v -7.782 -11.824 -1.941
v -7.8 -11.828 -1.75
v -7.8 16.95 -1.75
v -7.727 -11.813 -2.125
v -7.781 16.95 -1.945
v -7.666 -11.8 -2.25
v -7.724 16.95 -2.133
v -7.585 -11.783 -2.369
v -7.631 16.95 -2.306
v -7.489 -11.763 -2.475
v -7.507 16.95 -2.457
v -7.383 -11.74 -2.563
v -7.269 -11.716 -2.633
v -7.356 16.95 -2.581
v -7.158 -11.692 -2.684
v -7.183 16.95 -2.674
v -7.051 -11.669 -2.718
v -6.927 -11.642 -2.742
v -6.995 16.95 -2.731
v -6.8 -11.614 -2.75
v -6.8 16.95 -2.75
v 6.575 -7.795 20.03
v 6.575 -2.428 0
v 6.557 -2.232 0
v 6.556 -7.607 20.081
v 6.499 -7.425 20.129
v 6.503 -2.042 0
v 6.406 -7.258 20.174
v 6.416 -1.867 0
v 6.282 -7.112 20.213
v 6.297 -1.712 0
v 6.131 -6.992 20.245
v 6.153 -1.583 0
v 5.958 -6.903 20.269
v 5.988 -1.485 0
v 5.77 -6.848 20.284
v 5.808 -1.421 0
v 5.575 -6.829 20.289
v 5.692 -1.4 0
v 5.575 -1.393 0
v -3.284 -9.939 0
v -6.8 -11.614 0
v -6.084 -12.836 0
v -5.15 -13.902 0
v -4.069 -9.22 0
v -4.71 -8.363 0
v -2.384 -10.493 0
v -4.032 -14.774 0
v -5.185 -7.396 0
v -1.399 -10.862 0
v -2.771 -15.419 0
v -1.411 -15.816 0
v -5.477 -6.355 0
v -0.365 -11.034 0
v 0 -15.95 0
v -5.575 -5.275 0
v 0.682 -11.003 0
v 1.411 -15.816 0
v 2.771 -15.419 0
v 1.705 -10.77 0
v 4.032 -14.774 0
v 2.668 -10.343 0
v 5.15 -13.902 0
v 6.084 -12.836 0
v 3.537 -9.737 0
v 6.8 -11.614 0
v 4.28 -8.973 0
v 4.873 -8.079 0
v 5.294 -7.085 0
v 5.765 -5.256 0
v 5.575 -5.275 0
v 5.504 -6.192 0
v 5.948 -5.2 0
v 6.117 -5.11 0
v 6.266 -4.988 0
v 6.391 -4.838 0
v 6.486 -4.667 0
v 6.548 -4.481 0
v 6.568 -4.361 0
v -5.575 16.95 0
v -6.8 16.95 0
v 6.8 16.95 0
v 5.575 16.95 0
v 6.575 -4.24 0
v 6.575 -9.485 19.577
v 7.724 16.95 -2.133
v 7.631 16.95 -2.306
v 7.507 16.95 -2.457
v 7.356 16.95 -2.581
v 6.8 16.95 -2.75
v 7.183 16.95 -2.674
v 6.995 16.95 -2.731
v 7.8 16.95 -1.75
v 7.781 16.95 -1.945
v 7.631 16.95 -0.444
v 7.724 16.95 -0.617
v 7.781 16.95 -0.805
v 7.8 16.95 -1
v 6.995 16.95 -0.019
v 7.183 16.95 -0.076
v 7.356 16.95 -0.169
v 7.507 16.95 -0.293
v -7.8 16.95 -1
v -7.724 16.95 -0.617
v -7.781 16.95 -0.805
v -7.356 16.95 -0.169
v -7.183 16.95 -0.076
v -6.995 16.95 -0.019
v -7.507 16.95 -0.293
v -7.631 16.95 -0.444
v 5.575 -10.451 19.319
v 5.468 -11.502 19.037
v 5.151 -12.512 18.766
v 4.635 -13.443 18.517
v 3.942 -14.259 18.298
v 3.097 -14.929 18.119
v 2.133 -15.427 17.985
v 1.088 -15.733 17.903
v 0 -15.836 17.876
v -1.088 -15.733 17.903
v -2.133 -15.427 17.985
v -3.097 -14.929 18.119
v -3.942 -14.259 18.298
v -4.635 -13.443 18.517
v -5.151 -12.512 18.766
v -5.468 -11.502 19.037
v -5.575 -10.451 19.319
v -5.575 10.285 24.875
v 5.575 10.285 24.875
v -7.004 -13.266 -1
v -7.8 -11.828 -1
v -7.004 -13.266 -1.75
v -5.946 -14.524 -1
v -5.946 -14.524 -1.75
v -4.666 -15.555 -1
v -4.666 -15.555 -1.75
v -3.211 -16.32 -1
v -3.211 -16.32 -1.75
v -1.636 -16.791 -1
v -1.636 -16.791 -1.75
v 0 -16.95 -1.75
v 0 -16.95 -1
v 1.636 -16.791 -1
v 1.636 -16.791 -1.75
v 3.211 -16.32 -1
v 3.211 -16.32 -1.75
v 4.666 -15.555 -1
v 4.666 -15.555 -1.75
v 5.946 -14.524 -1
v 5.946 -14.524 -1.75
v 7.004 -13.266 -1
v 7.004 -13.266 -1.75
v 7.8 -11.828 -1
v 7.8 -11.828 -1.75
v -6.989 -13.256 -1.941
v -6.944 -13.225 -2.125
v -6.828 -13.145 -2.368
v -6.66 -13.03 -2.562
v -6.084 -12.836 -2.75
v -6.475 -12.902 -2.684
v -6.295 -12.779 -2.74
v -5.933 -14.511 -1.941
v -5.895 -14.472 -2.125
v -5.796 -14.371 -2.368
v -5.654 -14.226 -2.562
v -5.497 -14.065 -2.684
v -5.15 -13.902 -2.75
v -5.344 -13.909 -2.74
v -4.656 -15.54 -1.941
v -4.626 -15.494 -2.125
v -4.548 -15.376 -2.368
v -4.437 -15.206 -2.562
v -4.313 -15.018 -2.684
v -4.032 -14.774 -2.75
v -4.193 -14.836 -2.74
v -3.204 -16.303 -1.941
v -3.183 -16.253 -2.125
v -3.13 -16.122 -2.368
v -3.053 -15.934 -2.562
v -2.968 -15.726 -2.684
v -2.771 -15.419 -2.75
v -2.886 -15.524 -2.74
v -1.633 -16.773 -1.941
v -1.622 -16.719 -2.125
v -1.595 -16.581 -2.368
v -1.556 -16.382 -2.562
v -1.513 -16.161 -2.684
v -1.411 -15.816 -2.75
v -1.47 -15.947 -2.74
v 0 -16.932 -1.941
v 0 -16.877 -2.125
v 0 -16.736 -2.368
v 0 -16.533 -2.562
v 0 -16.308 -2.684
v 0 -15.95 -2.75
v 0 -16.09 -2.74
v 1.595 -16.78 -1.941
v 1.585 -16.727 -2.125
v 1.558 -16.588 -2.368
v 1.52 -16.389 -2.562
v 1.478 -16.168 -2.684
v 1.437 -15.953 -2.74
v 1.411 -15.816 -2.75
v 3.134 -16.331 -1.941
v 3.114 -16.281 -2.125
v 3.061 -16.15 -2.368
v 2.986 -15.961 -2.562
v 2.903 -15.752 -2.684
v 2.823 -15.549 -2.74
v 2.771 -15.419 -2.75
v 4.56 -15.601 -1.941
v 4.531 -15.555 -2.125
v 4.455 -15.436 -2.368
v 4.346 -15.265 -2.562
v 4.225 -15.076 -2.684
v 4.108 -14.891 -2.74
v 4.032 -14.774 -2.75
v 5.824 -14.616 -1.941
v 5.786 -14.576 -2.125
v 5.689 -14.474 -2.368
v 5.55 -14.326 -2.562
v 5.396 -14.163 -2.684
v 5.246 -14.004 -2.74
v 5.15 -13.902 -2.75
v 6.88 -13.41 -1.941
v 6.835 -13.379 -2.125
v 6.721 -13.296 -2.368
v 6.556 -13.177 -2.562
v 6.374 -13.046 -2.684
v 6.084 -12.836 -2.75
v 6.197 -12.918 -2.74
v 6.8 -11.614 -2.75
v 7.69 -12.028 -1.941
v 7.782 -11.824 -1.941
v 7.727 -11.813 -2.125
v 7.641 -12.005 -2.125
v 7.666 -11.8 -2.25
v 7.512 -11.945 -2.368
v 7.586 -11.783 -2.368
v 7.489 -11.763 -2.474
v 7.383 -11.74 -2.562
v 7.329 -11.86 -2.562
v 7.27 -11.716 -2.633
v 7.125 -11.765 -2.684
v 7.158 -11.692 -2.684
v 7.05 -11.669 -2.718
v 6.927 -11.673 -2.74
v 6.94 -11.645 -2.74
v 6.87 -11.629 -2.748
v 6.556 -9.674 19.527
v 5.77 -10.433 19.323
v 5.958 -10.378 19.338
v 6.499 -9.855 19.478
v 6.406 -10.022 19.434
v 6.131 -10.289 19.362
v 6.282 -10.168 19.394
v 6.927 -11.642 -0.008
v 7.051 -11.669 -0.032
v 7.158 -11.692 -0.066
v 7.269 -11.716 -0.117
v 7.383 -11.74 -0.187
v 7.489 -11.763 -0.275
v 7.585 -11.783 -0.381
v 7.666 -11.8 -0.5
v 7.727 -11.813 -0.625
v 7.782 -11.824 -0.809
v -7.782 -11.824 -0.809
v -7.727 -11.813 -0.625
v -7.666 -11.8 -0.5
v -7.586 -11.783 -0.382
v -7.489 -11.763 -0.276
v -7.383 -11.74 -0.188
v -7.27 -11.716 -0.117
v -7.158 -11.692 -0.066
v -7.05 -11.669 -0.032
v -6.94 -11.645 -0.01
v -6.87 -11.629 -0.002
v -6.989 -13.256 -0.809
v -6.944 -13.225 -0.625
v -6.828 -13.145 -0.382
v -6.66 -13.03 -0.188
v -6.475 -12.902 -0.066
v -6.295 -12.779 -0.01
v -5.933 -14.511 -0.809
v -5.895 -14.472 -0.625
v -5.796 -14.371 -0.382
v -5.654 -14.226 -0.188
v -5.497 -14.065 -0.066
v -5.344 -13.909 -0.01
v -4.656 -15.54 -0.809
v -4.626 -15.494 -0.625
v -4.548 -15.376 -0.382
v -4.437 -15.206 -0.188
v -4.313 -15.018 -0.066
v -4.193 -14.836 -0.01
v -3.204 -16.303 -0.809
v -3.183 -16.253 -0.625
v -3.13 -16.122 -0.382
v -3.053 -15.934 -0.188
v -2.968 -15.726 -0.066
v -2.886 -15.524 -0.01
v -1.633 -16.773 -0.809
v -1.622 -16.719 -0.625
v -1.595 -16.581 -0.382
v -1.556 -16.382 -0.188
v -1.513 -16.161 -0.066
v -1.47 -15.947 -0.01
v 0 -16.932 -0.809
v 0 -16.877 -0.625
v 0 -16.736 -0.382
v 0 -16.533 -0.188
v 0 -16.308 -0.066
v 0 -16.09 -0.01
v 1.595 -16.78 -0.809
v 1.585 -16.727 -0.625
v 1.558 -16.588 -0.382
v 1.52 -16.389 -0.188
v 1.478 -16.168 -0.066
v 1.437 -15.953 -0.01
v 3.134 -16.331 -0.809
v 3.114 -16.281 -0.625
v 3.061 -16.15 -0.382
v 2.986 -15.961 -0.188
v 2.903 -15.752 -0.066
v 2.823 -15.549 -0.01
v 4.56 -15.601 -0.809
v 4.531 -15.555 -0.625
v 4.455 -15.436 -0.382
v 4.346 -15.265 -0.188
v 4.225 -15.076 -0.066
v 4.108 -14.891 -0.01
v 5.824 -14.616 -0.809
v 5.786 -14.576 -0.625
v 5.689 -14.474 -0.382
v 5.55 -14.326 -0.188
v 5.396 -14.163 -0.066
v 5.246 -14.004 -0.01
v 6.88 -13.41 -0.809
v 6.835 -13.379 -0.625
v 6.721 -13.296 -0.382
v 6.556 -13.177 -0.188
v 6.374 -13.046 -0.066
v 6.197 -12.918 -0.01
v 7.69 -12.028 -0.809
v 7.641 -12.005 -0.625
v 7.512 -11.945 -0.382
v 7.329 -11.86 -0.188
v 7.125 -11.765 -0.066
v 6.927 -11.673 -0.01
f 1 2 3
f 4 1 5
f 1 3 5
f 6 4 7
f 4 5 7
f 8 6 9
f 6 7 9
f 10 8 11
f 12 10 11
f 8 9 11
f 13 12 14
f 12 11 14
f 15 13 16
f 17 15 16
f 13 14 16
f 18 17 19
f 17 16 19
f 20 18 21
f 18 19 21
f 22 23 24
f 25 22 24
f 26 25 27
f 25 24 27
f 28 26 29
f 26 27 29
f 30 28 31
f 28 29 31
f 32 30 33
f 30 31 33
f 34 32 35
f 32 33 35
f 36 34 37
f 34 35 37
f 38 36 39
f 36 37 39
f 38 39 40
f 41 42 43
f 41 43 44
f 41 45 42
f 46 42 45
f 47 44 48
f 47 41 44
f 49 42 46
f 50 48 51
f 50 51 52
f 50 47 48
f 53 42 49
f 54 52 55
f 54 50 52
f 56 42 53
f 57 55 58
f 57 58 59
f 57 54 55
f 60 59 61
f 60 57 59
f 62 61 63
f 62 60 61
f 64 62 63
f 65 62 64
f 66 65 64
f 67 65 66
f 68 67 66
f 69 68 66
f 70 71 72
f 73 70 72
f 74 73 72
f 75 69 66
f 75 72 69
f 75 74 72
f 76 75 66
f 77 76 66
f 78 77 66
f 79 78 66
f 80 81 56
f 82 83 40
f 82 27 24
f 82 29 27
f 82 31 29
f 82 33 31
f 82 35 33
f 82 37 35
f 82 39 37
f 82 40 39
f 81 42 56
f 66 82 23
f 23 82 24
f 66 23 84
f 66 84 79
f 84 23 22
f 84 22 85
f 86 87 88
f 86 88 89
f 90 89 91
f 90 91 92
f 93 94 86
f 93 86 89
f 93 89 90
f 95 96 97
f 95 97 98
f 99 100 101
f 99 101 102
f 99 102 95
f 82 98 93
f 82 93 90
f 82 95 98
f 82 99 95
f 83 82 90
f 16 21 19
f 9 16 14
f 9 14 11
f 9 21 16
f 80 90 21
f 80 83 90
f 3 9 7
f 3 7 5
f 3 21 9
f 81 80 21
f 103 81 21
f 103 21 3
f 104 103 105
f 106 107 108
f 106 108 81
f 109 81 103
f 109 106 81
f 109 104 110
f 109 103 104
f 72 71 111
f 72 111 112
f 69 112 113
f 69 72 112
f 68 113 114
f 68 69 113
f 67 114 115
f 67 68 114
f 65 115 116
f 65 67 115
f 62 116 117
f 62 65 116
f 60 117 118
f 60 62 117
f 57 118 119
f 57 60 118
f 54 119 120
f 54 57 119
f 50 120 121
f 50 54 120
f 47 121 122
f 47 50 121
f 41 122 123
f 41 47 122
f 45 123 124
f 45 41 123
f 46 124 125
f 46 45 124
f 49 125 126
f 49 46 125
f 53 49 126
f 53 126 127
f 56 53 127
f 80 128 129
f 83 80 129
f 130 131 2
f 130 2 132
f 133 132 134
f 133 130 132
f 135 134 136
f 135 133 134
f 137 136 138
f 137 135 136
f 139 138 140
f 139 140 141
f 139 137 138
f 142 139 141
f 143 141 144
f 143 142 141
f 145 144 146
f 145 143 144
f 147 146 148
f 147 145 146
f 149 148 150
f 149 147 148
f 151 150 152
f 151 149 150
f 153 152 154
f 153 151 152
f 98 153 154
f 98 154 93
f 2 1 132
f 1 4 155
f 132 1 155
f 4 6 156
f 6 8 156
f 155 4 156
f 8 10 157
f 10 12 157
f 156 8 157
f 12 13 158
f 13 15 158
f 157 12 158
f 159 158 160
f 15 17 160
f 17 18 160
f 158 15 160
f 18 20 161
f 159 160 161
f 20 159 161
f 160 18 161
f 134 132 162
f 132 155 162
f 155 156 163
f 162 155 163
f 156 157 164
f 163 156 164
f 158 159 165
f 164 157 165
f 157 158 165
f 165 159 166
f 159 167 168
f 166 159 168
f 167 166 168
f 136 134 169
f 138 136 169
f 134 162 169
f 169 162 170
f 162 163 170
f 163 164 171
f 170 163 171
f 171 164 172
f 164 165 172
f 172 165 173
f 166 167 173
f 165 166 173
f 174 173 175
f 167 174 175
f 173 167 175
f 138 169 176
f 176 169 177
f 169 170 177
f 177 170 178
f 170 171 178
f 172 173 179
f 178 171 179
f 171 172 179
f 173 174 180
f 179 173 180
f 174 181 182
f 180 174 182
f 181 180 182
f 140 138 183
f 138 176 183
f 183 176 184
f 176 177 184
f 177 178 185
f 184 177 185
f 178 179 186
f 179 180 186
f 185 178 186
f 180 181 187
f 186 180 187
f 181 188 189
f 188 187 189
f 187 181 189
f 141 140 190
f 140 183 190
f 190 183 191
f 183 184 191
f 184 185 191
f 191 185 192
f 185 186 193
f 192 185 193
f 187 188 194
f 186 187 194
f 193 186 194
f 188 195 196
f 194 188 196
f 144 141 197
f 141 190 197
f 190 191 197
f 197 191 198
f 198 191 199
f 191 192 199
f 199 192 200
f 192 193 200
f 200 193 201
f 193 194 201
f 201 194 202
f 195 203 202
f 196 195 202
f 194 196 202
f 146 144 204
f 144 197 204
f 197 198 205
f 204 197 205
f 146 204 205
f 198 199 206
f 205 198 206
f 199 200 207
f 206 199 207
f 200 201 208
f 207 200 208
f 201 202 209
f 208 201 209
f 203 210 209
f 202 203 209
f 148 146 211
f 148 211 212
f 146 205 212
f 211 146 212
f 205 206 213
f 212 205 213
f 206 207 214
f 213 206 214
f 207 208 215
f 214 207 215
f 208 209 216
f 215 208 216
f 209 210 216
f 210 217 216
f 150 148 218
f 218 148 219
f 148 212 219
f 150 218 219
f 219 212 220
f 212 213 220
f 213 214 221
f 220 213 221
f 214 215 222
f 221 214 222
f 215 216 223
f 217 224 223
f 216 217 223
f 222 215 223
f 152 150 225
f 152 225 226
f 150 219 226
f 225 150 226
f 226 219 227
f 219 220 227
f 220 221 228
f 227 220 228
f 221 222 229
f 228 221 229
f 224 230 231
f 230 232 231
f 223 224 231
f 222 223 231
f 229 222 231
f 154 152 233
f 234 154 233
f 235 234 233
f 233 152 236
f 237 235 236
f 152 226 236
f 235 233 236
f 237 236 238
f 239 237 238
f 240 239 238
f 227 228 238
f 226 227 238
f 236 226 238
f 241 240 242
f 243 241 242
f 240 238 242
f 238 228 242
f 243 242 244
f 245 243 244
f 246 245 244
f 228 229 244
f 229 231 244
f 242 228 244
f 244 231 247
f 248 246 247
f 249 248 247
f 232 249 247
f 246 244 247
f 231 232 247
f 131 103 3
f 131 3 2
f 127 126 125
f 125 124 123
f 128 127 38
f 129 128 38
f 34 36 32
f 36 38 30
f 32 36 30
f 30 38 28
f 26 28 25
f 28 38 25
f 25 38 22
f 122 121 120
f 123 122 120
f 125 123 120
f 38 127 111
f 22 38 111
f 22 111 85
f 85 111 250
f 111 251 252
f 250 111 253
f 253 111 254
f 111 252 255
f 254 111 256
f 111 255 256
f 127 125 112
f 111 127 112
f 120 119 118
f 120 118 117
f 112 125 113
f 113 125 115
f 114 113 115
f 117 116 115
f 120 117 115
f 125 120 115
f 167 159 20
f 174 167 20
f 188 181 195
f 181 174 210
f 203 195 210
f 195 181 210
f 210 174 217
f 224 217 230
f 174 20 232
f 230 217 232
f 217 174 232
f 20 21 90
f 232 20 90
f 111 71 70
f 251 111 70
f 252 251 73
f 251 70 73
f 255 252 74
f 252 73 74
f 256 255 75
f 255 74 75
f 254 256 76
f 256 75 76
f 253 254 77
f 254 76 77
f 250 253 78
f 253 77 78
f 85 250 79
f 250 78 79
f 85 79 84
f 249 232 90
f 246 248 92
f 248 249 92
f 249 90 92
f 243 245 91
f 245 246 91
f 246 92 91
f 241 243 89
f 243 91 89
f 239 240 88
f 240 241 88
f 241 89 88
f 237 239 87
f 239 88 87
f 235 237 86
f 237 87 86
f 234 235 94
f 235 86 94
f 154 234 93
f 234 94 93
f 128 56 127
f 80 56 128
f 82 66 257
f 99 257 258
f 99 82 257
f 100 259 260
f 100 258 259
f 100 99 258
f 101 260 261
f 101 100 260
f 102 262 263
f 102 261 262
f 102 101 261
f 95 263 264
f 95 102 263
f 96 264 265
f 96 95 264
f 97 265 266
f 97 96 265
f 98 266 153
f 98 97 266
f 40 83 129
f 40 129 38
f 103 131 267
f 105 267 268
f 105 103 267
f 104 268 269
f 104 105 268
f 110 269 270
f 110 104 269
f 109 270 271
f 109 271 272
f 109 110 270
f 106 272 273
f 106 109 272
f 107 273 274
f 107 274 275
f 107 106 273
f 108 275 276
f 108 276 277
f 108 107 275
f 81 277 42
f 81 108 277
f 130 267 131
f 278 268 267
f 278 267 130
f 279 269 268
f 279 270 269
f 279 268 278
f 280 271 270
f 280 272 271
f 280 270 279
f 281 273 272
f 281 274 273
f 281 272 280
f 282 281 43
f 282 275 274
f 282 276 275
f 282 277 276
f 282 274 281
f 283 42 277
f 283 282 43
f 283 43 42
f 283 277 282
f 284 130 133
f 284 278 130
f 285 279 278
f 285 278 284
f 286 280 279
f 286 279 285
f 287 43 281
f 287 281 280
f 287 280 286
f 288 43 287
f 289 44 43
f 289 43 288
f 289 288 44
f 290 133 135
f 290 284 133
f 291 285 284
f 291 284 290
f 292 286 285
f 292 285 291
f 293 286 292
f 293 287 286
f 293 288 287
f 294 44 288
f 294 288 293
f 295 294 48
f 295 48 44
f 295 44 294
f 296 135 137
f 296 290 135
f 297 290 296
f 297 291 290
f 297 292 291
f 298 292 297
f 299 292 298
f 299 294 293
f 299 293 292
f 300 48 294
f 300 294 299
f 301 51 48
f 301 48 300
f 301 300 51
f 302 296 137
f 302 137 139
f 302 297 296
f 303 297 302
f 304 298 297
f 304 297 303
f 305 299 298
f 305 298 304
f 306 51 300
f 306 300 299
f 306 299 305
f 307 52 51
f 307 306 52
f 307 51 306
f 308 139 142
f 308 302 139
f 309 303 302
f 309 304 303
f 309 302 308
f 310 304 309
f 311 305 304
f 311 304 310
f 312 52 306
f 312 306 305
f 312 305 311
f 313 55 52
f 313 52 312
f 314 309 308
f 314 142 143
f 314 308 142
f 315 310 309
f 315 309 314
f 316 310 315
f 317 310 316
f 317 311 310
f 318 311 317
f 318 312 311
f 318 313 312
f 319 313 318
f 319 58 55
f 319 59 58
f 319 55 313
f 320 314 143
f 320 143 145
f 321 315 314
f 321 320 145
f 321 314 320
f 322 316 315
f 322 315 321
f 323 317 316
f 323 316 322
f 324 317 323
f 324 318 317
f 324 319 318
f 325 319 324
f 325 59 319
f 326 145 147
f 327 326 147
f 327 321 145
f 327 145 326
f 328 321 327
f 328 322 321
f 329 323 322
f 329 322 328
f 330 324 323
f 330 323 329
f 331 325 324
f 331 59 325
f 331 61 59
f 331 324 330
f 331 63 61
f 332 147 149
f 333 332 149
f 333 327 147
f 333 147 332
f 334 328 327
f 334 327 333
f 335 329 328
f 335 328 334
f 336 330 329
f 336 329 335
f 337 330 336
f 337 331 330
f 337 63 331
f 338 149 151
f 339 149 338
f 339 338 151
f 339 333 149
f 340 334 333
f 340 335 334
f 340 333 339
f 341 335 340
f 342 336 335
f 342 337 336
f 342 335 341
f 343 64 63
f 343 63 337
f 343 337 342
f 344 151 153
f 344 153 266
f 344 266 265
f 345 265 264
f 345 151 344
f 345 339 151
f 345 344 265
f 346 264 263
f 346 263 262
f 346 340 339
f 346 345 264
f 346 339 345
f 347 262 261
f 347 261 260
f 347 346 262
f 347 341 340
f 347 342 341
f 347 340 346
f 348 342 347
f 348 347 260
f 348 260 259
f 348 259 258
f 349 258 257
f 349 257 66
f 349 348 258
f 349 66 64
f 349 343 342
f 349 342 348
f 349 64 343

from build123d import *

# Parameters (mm, degrees)
F2_W         = 1
F2_H         = 3.75
F3_DEPTH     = 20
F0_W         = 11.15
F0_H         = 22.225
F0_H_2       = 6.0527027428
F4_DEPTH     = 25
F5_DEPTH     = 2.75
F6_T1_DEPTH  = 33.7778691508
F6_T4_ANGLE  = 166.9020242579
F6_T6_ANGLE  = 166.9020242579
F6_T10_DEPTH = 25
F6_T15_DEPTH = 26.0048094716


# Not quite as in the source:
# - a fillet or chamfer that OpenCascade refuses, or shapes differently, is made with other operations: its cross-section is extruded or revolved along the edge and cut away or added


with BuildPart() as f3:
    # F2 (on line) → F3 (new body, symmetric)
    with BuildSketch(Plane(origin=(0, -0.3533579975, 1.31875), x_dir=(1, 0, 0), z_dir=(0, 0.2588190451, -0.9659258263))):
        with BuildLine():
            ThreePointArc((5.575, 5.0952587337), (0, 10.6702587337), (-5.575, 5.0952587337))
            Line((-5.575, 5.0952587337), (5.575, 5.0952587337))
        make_face()
        Polygon((5.575, 5.0952587337), (-5.575, 5.0952587337), (-5.575, -16.3724427556), (5.575, -16.3724427556), (5.575, 1.3452587337), align=None)
        with Locations((6.075, 3.2202587337)):
            Rectangle(F2_W, F2_H)
    extrude(amount=F3_DEPTH, both=True)

    # F0 (on Top) → F4 (cut)
    with BuildSketch(Plane.XY):
        with BuildLine():
            Line((5.575, -5.275), (-5.575, -5.275))
            ThreePointArc((-5.575, -5.275), (0, -10.85), (5.575, -5.275))
        make_face()
        with BuildLine():
            Line((-5.575, 16.95), (-7.8, 16.95))
            Line((-7.8, 16.95), (-7.8, -11.8278691508))
            ThreePointArc((-7.8, -11.8278691508), (-4.6657321086, -15.5549942921), (0, -16.95))
            ThreePointArc((0, -16.95), (4.6657321086, -15.5549942921), (7.8, -11.8278691508))
            Line((7.8, -11.8278691508), (7.8, 16.95))
            Line((7.8, 16.95), (5.575, 16.95))
            Line((5.575, 16.95), (5.575, -5.275))
            ThreePointArc((5.575, -5.275), (0, -10.85), (-5.575, -5.275))
            Line((-5.575, -5.275), (-5.575, 16.95))
        make_face()
        with Locations((0, 5.8375)):
            Rectangle(F0_W, F0_H)
        with Locations((0, 19.9763513714)):
            Rectangle(F0_W, F0_H_2)
    extrude(amount=-F4_DEPTH, mode=Mode.SUBTRACT)

    # F0 (on Top) → F5 (join)
    with BuildSketch(Plane.XY):
        with BuildLine():
            Line((-5.575, 16.95), (-7.8, 16.95))
            Line((-7.8, 16.95), (-7.8, -11.8278691508))
            ThreePointArc((-7.8, -11.8278691508), (-4.6657321086, -15.5549942921), (0, -16.95))
            ThreePointArc((0, -16.95), (4.6657321086, -15.5549942921), (7.8, -11.8278691508))
            Line((7.8, -11.8278691508), (7.8, 16.95))
            Line((7.8, 16.95), (5.575, 16.95))
            Line((5.575, 16.95), (5.575, -5.275))
            ThreePointArc((5.575, -5.275), (0, -10.85), (-5.575, -5.275))
            Line((-5.575, -5.275), (-5.575, 16.95))
        make_face()
        with BuildLine():
            Line((5.575, -5.275), (-5.575, -5.275))
            ThreePointArc((-5.575, -5.275), (0, -10.85), (5.575, -5.275))
        make_face()
        with Locations((0, 5.8375)):
            Rectangle(F0_W, F0_H)
    extrude(amount=-F5_DEPTH)

    # F6: fillet of radius 1 on 8 edges, made by hand

    # F6_s2 → F6_t1 (cut)
    with BuildSketch(Plane.XZ.offset(-19.45)):
        with BuildLine():
            ThreePointArc((6.8, 0), (7.5071067812, -0.2928932188), (7.8, -1))
            Line((7.8, -1), (7.8, 0))
            Line((7.8, 0), (6.8, 0))
        make_face()
        with BuildLine():
            ThreePointArc((6.8, -2.75), (7.5071067812, -2.4571067812), (7.8, -1.75))
            Line((7.8, -1.75), (7.8, -2.75))
            Line((7.8, -2.75), (6.8, -2.75))
        make_face()
        with BuildLine():
            ThreePointArc((-7.8, -1), (-7.5071067812, -0.2928932188), (-6.8, 0))
            Line((-6.8, 0), (-7.8, 0))
            Line((-7.8, 0), (-7.8, -1))
        make_face()
        with BuildLine():
            ThreePointArc((-7.8, -1.75), (-7.5071067812, -2.4571067812), (-6.8, -2.75))
            Line((-6.8, -2.75), (-7.8, -2.75))
            Line((-7.8, -2.75), (-7.8, -1.75))
        make_face()
    extrude(amount=F6_T1_DEPTH, mode=Mode.SUBTRACT)

    # F6_s3 → F6_t4 (revolve, cut)
    with BuildSketch(Plane(origin=(0.9574563888, -8.3400822912, 0), x_dir=(0, 0, 1), z_dir=(-0.1140526759, 0.9934747038, 0))):
        with BuildLine():
            ThreePointArc((-1, -9.4637451111), (-0.2928932188, -9.1708518923), (0, -8.4637451111))
            Line((0, -8.4637451111), (0, -9.4637451111))
            Line((0, -9.4637451111), (-1, -9.4637451111))
        make_face()
    revolve(axis=Axis((0, -8.45, 0), (0, 0, 1)), revolution_arc=F6_T4_ANGLE, mode=Mode.SUBTRACT)

    # F6_s5 → F6_t6 (revolve, cut)
    with BuildSketch(Plane(origin=(0.9574563888, -8.3400822912, 0), x_dir=(0, 0, 1), z_dir=(-0.1140526759, 0.9934747038, 0))):
        with BuildLine():
            ThreePointArc((-1.75, -9.4637451111), (-2.4571067812, -9.1708518923), (-2.75, -8.4637451111))
            Line((-2.75, -8.4637451111), (-2.75, -9.4637451111))
            Line((-2.75, -9.4637451111), (-1.75, -9.4637451111))
        make_face()
    revolve(axis=Axis((0, -8.45, -2.75), (0, 0, 1)), revolution_arc=F6_T6_ANGLE, mode=Mode.SUBTRACT)


with BuildPart() as f6_tool8:
    # F6_s9 → F6_t10 (new body)
    with BuildSketch(Plane(origin=(0, 0.2936896152, -1.0960645657), x_dir=(1, 0, 0), z_dir=(0, -0.2588190451, 0.9659258263))):
        with BuildLine():
            ThreePointArc((5.575, -5.0952587337), (6.2821067812, -4.8023655149), (6.575, -4.0952587337))
            Line((6.575, -4.0952587337), (6.575, -5.0952587337))
            Line((6.575, -5.0952587337), (5.575, -5.0952587337))
        make_face()
    extrude(amount=F6_T10_DEPTH)

    split(bisect_by=Plane.XY, keep=Keep.TOP)


with BuildPart() as f3_1:
    add(f3.part)

    # F6_t7: cut F6_tool8
    add(f6_tool8.part, mode=Mode.SUBTRACT)


with BuildPart() as f6_tool13:
    # F6_s14 → F6_t15 (new body)
    with BuildSketch(Plane(origin=(0, 0.5537534432, -2.0666359849), x_dir=(1, 0, 0), z_dir=(0, -0.2588190451, 0.9659258263))):
        with BuildLine():
            ThreePointArc((6.575, -2.3452587337), (6.2821067812, -1.6381519525), (5.575, -1.3452587337))
            Line((5.575, -1.3452587337), (6.575, -1.3452587337))
            Line((6.575, -1.3452587337), (6.575, -2.3452587337))
        make_face()
    extrude(amount=F6_T15_DEPTH)

    split(bisect_by=Plane.XY, keep=Keep.TOP)


with BuildPart() as f3_2:
    add(f3_1.part)

    # F6_t12: cut F6_tool13
    add(f6_tool13.part, mode=Mode.SUBTRACT)


solid = f3_2.part
